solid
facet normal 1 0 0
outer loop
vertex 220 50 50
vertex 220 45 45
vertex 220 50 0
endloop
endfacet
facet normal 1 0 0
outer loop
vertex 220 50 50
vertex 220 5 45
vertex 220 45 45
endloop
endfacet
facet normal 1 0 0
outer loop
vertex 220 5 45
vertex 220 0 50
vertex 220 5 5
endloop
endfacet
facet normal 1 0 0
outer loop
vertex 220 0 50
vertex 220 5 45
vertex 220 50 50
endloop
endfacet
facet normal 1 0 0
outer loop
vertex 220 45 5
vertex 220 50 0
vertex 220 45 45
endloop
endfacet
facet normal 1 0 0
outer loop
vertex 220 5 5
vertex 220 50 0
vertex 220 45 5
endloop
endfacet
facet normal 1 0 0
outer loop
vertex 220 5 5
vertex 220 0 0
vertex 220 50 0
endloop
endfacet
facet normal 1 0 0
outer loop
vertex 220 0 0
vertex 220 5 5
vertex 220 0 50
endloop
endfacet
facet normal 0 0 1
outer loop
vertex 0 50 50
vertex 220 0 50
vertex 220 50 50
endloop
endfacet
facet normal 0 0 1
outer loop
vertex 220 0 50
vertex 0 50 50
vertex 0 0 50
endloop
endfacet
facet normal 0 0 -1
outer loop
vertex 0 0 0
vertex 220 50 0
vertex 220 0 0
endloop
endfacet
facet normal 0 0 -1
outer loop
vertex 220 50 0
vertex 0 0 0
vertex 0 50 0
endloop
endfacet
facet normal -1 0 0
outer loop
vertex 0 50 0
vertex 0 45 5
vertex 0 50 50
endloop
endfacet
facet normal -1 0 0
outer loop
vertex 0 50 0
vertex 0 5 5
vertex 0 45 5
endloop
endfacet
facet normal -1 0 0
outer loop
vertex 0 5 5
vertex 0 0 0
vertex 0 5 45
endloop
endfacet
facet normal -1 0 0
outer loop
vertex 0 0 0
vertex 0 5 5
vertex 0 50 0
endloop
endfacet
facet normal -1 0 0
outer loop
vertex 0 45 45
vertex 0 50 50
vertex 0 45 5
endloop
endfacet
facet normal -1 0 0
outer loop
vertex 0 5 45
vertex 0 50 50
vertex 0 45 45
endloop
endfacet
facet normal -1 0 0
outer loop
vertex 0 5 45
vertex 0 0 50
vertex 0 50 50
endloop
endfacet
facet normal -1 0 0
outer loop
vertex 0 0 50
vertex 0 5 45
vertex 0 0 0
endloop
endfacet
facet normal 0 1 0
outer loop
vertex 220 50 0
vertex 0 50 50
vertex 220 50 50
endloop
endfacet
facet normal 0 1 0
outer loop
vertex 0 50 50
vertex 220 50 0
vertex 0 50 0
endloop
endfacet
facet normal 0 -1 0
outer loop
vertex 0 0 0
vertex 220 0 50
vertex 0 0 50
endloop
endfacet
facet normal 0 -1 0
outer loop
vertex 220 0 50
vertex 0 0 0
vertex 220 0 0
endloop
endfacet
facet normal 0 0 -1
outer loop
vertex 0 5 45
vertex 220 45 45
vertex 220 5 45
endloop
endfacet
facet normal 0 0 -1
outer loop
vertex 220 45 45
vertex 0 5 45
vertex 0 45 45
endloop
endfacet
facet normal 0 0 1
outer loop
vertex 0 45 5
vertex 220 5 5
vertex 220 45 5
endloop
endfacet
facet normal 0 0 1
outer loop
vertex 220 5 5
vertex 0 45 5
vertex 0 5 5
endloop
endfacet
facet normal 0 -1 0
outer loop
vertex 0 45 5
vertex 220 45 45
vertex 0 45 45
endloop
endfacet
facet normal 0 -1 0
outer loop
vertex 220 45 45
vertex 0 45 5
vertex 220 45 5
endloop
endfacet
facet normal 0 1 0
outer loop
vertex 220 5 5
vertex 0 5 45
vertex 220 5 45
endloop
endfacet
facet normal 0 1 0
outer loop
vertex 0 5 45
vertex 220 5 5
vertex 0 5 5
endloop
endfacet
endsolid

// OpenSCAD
$fn = 32;

// ----------------------------------------------------------------------
// Box beam: 200-250 mm hollow beam
// ----------------------------------------------------------------------

// --- parameters (mm) ---
beam_l = 220;             // beam length, X
beam_w = 50;              // beam width, Y
beam_h = 50;              // beam height, Z
wall = 5;                 // wall thickness

difference() {
  cube([beam_l, beam_w, beam_h]);
  translate([-1, wall, wall])
    cube([beam_l + 2, beam_w - 2 * wall, beam_h - 2 * wall]);
}
